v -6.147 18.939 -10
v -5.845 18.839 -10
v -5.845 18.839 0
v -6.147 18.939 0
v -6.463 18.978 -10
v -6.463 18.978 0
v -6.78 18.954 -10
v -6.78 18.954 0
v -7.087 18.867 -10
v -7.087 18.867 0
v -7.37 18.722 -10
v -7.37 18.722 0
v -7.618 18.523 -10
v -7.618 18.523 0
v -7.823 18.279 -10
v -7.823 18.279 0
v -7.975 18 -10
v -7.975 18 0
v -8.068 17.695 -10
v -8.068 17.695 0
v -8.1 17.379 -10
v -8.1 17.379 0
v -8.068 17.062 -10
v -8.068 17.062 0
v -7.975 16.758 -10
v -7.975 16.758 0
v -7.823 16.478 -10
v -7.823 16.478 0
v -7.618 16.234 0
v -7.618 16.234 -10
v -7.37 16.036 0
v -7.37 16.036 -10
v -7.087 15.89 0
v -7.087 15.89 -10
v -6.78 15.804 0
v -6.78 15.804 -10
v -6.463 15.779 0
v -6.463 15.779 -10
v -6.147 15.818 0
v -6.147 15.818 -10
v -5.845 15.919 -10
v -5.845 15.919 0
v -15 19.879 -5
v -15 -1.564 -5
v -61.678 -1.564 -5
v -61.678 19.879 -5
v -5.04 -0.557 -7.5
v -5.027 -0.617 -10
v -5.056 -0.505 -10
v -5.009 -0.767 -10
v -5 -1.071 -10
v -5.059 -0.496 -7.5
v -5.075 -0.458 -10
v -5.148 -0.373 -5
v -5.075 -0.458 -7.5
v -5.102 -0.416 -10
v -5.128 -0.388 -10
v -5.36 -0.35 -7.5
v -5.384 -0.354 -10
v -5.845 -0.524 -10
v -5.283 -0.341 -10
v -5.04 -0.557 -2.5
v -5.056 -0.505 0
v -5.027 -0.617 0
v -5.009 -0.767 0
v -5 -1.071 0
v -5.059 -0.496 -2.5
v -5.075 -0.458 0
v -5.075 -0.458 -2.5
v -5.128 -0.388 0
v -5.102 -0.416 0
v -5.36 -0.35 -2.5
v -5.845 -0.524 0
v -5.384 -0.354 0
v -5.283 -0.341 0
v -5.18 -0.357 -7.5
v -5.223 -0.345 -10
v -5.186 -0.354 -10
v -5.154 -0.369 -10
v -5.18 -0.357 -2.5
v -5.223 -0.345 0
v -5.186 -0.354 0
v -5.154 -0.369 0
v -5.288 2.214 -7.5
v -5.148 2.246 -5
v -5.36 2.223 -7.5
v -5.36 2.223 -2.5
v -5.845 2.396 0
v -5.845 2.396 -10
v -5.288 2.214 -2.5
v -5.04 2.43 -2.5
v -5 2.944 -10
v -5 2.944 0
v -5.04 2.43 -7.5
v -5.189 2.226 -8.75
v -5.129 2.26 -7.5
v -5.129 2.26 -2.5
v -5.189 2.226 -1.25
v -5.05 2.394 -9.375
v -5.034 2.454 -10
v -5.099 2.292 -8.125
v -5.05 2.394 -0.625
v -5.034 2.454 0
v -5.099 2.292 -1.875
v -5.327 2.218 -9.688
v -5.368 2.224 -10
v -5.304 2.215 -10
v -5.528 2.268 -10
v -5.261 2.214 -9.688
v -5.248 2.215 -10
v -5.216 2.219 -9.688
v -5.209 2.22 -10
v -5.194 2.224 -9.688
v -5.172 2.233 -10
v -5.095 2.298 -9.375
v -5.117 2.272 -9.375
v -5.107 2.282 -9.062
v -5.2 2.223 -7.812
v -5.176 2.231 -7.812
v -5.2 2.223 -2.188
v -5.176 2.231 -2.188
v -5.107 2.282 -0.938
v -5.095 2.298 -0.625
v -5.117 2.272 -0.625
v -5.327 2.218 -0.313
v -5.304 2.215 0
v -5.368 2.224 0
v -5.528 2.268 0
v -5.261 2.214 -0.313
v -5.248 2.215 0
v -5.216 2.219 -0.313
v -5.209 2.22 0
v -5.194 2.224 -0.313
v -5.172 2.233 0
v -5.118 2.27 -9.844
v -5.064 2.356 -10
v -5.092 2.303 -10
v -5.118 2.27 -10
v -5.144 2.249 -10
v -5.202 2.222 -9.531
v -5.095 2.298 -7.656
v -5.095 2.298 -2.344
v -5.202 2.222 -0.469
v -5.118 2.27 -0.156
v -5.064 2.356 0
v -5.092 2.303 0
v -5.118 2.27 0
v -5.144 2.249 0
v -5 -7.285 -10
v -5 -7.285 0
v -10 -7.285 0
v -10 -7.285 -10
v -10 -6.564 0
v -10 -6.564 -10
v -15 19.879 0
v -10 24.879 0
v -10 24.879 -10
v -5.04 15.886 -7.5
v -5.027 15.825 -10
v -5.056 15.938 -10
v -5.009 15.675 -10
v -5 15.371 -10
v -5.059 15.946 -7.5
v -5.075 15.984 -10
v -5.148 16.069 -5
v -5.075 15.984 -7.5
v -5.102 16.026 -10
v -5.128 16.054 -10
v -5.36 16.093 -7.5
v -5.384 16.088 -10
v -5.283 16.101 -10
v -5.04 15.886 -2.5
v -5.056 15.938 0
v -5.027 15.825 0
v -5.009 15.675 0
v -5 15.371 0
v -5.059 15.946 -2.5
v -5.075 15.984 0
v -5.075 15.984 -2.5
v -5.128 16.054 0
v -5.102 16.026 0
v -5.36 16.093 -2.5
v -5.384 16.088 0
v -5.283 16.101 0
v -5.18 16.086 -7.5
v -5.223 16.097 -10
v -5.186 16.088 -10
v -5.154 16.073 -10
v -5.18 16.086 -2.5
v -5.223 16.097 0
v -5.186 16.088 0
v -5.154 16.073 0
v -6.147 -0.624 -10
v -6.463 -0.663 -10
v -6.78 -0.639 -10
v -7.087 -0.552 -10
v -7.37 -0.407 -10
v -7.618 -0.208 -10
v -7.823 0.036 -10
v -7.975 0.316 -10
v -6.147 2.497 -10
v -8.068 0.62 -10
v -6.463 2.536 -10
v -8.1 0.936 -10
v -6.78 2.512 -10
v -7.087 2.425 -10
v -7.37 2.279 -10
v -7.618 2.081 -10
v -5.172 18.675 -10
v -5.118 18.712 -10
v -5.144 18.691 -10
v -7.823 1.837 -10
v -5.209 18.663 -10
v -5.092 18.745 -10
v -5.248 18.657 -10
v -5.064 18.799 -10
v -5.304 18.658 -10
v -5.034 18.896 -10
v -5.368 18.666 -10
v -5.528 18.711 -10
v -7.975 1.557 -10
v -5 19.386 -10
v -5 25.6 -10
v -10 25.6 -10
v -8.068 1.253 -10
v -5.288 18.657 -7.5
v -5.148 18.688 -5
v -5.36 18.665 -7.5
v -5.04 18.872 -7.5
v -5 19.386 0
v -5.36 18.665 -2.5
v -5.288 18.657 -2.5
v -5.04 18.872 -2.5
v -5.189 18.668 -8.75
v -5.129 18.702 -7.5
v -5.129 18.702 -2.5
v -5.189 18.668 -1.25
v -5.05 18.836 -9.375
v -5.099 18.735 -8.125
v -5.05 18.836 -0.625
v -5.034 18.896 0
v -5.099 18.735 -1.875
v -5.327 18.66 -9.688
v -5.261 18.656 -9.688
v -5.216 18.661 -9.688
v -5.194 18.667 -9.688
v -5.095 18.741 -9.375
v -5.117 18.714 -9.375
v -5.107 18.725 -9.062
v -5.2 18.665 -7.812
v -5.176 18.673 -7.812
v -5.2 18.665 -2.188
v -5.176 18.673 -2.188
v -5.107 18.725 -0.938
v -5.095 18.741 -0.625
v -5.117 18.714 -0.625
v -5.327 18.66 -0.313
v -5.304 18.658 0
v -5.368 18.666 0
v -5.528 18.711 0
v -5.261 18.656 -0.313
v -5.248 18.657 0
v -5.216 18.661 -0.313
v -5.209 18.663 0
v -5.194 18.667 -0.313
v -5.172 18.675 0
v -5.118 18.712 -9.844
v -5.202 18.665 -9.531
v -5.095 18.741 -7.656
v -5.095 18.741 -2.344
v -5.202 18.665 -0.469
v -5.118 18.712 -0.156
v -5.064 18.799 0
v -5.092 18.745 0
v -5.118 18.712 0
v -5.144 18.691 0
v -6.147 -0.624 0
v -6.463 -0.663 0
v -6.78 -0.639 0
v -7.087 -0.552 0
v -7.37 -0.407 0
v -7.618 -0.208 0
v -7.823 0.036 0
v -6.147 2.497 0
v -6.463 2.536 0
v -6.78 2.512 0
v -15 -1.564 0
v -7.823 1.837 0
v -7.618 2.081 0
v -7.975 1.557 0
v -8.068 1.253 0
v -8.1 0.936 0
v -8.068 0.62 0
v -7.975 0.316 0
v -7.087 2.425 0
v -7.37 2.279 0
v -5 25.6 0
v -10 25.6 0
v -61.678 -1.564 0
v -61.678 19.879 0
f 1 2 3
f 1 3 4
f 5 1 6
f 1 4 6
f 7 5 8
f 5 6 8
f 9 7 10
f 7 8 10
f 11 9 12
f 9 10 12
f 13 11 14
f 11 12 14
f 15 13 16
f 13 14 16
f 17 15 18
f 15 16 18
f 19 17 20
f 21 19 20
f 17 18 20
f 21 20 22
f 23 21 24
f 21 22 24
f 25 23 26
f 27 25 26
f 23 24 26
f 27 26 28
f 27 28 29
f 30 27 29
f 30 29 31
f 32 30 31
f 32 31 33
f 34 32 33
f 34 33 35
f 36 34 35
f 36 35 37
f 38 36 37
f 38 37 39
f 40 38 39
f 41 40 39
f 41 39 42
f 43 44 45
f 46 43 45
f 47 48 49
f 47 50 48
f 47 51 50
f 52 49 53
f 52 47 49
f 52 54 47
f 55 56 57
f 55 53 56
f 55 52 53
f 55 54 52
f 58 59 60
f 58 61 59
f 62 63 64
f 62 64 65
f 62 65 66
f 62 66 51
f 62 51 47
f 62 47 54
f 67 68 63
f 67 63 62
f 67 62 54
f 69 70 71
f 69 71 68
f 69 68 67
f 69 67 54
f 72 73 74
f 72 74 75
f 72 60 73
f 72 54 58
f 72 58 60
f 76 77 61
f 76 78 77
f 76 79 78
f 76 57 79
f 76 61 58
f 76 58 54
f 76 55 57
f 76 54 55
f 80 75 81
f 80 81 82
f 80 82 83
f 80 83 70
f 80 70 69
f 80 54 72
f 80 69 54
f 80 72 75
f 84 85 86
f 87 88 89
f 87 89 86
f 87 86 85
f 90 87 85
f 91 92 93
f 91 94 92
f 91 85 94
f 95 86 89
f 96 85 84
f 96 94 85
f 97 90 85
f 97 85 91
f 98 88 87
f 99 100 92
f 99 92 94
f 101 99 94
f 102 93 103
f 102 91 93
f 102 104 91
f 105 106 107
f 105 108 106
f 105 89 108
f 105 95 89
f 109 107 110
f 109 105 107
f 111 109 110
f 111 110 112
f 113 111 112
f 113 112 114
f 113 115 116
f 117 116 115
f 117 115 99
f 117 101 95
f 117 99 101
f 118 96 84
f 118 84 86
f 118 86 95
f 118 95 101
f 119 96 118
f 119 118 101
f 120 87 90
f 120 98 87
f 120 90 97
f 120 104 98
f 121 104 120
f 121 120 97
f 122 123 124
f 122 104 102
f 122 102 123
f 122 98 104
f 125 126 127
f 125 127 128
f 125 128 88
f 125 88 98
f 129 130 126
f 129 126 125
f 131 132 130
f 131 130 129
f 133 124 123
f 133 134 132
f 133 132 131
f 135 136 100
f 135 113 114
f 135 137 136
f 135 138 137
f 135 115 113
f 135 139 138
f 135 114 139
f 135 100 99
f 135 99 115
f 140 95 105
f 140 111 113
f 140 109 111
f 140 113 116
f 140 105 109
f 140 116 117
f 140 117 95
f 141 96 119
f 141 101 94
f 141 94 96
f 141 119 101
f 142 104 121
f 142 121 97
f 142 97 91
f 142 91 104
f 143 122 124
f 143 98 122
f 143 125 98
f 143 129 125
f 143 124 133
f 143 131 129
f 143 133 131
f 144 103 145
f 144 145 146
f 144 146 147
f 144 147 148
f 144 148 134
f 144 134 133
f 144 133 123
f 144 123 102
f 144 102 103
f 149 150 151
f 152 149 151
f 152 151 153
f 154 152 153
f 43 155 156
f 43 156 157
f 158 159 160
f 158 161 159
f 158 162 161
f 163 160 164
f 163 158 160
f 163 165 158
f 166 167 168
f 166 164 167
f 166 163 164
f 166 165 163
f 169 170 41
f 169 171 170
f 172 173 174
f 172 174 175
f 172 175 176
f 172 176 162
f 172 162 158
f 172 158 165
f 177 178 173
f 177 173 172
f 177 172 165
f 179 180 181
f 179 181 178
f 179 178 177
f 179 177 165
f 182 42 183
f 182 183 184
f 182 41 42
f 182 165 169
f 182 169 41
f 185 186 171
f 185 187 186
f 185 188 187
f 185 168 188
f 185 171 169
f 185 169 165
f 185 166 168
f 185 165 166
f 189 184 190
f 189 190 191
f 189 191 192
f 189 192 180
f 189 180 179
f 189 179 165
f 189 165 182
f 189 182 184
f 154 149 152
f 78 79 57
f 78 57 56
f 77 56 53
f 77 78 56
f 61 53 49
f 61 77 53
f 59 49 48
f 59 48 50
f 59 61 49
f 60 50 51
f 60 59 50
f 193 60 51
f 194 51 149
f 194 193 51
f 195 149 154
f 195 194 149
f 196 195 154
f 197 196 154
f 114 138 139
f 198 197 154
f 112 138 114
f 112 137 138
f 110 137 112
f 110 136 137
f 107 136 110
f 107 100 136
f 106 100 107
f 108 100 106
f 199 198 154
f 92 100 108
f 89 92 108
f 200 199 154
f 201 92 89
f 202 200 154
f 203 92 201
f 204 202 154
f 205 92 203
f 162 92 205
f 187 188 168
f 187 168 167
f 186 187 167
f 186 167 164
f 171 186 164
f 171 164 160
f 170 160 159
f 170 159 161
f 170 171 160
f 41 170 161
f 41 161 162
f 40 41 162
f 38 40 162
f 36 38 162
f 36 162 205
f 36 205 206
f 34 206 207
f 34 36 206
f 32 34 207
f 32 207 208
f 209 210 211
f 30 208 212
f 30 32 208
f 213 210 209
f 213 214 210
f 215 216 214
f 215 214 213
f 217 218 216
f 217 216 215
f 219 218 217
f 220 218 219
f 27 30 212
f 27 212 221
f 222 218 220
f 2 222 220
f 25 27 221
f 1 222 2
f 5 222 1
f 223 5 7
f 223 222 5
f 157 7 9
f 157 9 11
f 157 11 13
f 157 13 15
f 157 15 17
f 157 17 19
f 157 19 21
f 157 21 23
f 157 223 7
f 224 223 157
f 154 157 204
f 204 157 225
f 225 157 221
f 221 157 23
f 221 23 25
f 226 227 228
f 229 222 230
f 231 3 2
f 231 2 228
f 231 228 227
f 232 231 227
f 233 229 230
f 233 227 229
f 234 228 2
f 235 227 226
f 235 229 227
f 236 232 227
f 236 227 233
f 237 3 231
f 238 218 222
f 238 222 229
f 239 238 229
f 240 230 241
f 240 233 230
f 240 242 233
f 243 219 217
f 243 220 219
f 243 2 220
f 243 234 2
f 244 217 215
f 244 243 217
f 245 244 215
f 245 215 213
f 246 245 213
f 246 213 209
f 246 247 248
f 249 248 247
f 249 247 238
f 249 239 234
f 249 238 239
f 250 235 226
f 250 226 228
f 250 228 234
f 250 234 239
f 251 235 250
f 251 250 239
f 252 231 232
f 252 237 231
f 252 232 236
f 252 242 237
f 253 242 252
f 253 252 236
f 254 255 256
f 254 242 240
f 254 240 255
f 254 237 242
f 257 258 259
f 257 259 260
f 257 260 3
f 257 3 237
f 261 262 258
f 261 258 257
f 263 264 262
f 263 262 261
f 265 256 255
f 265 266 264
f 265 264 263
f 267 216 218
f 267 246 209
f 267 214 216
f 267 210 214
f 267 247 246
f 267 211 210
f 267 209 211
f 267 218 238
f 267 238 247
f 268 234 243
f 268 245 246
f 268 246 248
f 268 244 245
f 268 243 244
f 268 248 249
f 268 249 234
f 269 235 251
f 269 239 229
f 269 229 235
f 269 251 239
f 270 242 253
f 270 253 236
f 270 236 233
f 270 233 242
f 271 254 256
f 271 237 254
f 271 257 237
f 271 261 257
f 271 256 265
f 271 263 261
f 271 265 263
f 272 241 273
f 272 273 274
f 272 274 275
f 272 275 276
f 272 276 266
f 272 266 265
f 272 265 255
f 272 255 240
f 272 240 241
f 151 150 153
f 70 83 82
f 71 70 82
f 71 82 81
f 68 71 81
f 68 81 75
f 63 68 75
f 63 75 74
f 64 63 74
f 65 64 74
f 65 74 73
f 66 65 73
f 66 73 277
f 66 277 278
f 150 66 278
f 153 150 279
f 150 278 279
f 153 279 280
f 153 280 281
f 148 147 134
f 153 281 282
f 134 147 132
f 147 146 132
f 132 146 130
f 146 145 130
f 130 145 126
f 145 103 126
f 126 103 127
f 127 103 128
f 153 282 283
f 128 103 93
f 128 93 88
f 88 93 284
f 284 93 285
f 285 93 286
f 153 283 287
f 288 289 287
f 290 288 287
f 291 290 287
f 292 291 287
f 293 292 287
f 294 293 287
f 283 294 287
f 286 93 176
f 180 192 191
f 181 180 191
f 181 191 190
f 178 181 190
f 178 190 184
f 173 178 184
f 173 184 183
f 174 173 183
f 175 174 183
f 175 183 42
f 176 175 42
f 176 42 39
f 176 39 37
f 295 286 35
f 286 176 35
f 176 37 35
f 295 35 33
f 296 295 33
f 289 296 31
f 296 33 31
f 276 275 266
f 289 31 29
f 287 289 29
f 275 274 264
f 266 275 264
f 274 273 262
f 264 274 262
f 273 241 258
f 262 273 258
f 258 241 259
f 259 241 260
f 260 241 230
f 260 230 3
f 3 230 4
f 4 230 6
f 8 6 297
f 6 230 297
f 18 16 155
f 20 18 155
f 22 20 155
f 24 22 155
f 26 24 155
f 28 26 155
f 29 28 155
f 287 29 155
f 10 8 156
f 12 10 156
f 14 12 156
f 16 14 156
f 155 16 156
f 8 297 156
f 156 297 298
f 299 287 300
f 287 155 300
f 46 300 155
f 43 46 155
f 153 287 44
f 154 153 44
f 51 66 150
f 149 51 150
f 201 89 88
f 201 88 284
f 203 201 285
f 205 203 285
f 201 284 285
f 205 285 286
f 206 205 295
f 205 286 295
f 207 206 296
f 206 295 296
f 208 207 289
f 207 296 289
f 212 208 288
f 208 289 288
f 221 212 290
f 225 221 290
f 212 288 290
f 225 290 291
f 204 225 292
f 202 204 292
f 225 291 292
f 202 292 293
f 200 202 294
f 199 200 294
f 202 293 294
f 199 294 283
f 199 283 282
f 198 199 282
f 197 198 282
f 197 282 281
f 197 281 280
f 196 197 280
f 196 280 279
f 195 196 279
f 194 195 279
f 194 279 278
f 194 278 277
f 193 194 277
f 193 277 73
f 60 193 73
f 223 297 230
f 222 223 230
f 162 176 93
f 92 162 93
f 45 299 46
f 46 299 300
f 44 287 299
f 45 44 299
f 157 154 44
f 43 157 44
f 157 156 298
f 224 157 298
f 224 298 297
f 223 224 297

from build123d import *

# Parameters (mm, degrees)
SALIENTE_EXTRUIR1_DEPTH = 10
CHAFL_N1_SIZE           = 5
CORTAR_EXTRUIR1_DEPTH   = 38


with BuildPart() as part:
    # Croquis1 → Saliente-Extruir1 (new body)
    with BuildSketch(Plane.XY):
        with BuildLine():
            Line((-5, -7.284781413), (-10, -7.284781413))
            Line((-10, -7.284781413), (-10, -1.56358606))
            Line((-10, -1.56358606), (-61.678046138, -1.56358606))
            Line((-61.678046138, -1.56358606), (-61.678046138, 19.878804647))
            Line((-61.678046138, 19.878804647), (-10, 19.878804647))
            Line((-10, 19.878804647), (-10, 25.6))
            Line((-10, 25.6), (-5, 25.6))
            Line((-5, 25.6), (-5, 17.935581083))
            ThreePointArc((-5, 17.935581083), (-8.1, 17.378804647), (-5, 16.82202821))
            Line((-5, 16.82202821), (-5, 1.493190376))
            ThreePointArc((-5, 1.493190376), (-8.1, 0.93641394), (-5, 0.379637504))
            Line((-5, 0.379637504), (-5, -7.284781413))
        make_face()
    extrude(amount=-SALIENTE_EXTRUIR1_DEPTH)

    # Chaflán1
    chafl_n1_edges = [part.edges().sort_by_distance(p)[0] for p in [
        (-10, -1.56358606, -5),
        (-10, 19.878804647, -5),
    ]]
    chamfer(chafl_n1_edges, length=CHAFL_N1_SIZE)

    # Croquis2 → Cortar-Extruir1 (cut)
    with BuildSketch(Plane(origin=(-7.102128625, -7.284781413, 0), x_dir=(0, 0, -1), z_dir=(0, 1, 0))):
        Polygon((5, 7.897871375), (5, 54.575917513), (10, 54.575917513), (10, 2.897871375), align=None)
    extrude(amount=CORTAR_EXTRUIR1_DEPTH, mode=Mode.SUBTRACT)

    # Redondeo1
    # a fillet whose section is not a circle: 0.6 mm, written as the material it takes off along each edge
    with BuildSketch(Plane(origin=(-5, 17.935581083, 3.626773884), x_dir=(-0.6833782327560586, 0.730064511529773, 0), z_dir=(0, 0, -1)), Plane(origin=(-5, 1.493190376, 3.626773884), x_dir=(-0.6833782327560585, 0.7300645115297733, 0), z_dir=(0, 0, -1))) as redondeo1_piece_1:
        with BuildLine():
            Bezier((1.237169264, 0), (0.382683433, 0.358211533), (1.059111562, 0.991383331), weights=[1, 1.857142857, 1])
            Line((1.059111562, 0.991383331), (0, 0))
            ThreePointArc((0, 0), (0.618584632, 0.124414336), (1.237169264, 0))
        make_face()
    extrude(amount=17.253547769, mode=Mode.SUBTRACT)
    with BuildSketch(Plane(origin=(-5, 16.82202821, 3.626773884), x_dir=(0, -1, 0), z_dir=(0, 0, -1)), Plane(origin=(-5, 0.379637504, 3.626773884), x_dir=(0, -1, 0), z_dir=(0, 0, -1))) as redondeo1_piece_2:
        with BuildLine():
            Bezier((1.450709554, 0), (0.524177558, 0), (0.903213375, 0.845454545), weights=[1, 1.857142857, 1])
            ThreePointArc((0.903213375, 0.845454545), (0.536628736, 0.331896782), (0, 0))
            Line((0, 0), (1.450709554, 0))
        make_face()
    extrude(amount=17.253547769, mode=Mode.SUBTRACT)


solid = part.part
